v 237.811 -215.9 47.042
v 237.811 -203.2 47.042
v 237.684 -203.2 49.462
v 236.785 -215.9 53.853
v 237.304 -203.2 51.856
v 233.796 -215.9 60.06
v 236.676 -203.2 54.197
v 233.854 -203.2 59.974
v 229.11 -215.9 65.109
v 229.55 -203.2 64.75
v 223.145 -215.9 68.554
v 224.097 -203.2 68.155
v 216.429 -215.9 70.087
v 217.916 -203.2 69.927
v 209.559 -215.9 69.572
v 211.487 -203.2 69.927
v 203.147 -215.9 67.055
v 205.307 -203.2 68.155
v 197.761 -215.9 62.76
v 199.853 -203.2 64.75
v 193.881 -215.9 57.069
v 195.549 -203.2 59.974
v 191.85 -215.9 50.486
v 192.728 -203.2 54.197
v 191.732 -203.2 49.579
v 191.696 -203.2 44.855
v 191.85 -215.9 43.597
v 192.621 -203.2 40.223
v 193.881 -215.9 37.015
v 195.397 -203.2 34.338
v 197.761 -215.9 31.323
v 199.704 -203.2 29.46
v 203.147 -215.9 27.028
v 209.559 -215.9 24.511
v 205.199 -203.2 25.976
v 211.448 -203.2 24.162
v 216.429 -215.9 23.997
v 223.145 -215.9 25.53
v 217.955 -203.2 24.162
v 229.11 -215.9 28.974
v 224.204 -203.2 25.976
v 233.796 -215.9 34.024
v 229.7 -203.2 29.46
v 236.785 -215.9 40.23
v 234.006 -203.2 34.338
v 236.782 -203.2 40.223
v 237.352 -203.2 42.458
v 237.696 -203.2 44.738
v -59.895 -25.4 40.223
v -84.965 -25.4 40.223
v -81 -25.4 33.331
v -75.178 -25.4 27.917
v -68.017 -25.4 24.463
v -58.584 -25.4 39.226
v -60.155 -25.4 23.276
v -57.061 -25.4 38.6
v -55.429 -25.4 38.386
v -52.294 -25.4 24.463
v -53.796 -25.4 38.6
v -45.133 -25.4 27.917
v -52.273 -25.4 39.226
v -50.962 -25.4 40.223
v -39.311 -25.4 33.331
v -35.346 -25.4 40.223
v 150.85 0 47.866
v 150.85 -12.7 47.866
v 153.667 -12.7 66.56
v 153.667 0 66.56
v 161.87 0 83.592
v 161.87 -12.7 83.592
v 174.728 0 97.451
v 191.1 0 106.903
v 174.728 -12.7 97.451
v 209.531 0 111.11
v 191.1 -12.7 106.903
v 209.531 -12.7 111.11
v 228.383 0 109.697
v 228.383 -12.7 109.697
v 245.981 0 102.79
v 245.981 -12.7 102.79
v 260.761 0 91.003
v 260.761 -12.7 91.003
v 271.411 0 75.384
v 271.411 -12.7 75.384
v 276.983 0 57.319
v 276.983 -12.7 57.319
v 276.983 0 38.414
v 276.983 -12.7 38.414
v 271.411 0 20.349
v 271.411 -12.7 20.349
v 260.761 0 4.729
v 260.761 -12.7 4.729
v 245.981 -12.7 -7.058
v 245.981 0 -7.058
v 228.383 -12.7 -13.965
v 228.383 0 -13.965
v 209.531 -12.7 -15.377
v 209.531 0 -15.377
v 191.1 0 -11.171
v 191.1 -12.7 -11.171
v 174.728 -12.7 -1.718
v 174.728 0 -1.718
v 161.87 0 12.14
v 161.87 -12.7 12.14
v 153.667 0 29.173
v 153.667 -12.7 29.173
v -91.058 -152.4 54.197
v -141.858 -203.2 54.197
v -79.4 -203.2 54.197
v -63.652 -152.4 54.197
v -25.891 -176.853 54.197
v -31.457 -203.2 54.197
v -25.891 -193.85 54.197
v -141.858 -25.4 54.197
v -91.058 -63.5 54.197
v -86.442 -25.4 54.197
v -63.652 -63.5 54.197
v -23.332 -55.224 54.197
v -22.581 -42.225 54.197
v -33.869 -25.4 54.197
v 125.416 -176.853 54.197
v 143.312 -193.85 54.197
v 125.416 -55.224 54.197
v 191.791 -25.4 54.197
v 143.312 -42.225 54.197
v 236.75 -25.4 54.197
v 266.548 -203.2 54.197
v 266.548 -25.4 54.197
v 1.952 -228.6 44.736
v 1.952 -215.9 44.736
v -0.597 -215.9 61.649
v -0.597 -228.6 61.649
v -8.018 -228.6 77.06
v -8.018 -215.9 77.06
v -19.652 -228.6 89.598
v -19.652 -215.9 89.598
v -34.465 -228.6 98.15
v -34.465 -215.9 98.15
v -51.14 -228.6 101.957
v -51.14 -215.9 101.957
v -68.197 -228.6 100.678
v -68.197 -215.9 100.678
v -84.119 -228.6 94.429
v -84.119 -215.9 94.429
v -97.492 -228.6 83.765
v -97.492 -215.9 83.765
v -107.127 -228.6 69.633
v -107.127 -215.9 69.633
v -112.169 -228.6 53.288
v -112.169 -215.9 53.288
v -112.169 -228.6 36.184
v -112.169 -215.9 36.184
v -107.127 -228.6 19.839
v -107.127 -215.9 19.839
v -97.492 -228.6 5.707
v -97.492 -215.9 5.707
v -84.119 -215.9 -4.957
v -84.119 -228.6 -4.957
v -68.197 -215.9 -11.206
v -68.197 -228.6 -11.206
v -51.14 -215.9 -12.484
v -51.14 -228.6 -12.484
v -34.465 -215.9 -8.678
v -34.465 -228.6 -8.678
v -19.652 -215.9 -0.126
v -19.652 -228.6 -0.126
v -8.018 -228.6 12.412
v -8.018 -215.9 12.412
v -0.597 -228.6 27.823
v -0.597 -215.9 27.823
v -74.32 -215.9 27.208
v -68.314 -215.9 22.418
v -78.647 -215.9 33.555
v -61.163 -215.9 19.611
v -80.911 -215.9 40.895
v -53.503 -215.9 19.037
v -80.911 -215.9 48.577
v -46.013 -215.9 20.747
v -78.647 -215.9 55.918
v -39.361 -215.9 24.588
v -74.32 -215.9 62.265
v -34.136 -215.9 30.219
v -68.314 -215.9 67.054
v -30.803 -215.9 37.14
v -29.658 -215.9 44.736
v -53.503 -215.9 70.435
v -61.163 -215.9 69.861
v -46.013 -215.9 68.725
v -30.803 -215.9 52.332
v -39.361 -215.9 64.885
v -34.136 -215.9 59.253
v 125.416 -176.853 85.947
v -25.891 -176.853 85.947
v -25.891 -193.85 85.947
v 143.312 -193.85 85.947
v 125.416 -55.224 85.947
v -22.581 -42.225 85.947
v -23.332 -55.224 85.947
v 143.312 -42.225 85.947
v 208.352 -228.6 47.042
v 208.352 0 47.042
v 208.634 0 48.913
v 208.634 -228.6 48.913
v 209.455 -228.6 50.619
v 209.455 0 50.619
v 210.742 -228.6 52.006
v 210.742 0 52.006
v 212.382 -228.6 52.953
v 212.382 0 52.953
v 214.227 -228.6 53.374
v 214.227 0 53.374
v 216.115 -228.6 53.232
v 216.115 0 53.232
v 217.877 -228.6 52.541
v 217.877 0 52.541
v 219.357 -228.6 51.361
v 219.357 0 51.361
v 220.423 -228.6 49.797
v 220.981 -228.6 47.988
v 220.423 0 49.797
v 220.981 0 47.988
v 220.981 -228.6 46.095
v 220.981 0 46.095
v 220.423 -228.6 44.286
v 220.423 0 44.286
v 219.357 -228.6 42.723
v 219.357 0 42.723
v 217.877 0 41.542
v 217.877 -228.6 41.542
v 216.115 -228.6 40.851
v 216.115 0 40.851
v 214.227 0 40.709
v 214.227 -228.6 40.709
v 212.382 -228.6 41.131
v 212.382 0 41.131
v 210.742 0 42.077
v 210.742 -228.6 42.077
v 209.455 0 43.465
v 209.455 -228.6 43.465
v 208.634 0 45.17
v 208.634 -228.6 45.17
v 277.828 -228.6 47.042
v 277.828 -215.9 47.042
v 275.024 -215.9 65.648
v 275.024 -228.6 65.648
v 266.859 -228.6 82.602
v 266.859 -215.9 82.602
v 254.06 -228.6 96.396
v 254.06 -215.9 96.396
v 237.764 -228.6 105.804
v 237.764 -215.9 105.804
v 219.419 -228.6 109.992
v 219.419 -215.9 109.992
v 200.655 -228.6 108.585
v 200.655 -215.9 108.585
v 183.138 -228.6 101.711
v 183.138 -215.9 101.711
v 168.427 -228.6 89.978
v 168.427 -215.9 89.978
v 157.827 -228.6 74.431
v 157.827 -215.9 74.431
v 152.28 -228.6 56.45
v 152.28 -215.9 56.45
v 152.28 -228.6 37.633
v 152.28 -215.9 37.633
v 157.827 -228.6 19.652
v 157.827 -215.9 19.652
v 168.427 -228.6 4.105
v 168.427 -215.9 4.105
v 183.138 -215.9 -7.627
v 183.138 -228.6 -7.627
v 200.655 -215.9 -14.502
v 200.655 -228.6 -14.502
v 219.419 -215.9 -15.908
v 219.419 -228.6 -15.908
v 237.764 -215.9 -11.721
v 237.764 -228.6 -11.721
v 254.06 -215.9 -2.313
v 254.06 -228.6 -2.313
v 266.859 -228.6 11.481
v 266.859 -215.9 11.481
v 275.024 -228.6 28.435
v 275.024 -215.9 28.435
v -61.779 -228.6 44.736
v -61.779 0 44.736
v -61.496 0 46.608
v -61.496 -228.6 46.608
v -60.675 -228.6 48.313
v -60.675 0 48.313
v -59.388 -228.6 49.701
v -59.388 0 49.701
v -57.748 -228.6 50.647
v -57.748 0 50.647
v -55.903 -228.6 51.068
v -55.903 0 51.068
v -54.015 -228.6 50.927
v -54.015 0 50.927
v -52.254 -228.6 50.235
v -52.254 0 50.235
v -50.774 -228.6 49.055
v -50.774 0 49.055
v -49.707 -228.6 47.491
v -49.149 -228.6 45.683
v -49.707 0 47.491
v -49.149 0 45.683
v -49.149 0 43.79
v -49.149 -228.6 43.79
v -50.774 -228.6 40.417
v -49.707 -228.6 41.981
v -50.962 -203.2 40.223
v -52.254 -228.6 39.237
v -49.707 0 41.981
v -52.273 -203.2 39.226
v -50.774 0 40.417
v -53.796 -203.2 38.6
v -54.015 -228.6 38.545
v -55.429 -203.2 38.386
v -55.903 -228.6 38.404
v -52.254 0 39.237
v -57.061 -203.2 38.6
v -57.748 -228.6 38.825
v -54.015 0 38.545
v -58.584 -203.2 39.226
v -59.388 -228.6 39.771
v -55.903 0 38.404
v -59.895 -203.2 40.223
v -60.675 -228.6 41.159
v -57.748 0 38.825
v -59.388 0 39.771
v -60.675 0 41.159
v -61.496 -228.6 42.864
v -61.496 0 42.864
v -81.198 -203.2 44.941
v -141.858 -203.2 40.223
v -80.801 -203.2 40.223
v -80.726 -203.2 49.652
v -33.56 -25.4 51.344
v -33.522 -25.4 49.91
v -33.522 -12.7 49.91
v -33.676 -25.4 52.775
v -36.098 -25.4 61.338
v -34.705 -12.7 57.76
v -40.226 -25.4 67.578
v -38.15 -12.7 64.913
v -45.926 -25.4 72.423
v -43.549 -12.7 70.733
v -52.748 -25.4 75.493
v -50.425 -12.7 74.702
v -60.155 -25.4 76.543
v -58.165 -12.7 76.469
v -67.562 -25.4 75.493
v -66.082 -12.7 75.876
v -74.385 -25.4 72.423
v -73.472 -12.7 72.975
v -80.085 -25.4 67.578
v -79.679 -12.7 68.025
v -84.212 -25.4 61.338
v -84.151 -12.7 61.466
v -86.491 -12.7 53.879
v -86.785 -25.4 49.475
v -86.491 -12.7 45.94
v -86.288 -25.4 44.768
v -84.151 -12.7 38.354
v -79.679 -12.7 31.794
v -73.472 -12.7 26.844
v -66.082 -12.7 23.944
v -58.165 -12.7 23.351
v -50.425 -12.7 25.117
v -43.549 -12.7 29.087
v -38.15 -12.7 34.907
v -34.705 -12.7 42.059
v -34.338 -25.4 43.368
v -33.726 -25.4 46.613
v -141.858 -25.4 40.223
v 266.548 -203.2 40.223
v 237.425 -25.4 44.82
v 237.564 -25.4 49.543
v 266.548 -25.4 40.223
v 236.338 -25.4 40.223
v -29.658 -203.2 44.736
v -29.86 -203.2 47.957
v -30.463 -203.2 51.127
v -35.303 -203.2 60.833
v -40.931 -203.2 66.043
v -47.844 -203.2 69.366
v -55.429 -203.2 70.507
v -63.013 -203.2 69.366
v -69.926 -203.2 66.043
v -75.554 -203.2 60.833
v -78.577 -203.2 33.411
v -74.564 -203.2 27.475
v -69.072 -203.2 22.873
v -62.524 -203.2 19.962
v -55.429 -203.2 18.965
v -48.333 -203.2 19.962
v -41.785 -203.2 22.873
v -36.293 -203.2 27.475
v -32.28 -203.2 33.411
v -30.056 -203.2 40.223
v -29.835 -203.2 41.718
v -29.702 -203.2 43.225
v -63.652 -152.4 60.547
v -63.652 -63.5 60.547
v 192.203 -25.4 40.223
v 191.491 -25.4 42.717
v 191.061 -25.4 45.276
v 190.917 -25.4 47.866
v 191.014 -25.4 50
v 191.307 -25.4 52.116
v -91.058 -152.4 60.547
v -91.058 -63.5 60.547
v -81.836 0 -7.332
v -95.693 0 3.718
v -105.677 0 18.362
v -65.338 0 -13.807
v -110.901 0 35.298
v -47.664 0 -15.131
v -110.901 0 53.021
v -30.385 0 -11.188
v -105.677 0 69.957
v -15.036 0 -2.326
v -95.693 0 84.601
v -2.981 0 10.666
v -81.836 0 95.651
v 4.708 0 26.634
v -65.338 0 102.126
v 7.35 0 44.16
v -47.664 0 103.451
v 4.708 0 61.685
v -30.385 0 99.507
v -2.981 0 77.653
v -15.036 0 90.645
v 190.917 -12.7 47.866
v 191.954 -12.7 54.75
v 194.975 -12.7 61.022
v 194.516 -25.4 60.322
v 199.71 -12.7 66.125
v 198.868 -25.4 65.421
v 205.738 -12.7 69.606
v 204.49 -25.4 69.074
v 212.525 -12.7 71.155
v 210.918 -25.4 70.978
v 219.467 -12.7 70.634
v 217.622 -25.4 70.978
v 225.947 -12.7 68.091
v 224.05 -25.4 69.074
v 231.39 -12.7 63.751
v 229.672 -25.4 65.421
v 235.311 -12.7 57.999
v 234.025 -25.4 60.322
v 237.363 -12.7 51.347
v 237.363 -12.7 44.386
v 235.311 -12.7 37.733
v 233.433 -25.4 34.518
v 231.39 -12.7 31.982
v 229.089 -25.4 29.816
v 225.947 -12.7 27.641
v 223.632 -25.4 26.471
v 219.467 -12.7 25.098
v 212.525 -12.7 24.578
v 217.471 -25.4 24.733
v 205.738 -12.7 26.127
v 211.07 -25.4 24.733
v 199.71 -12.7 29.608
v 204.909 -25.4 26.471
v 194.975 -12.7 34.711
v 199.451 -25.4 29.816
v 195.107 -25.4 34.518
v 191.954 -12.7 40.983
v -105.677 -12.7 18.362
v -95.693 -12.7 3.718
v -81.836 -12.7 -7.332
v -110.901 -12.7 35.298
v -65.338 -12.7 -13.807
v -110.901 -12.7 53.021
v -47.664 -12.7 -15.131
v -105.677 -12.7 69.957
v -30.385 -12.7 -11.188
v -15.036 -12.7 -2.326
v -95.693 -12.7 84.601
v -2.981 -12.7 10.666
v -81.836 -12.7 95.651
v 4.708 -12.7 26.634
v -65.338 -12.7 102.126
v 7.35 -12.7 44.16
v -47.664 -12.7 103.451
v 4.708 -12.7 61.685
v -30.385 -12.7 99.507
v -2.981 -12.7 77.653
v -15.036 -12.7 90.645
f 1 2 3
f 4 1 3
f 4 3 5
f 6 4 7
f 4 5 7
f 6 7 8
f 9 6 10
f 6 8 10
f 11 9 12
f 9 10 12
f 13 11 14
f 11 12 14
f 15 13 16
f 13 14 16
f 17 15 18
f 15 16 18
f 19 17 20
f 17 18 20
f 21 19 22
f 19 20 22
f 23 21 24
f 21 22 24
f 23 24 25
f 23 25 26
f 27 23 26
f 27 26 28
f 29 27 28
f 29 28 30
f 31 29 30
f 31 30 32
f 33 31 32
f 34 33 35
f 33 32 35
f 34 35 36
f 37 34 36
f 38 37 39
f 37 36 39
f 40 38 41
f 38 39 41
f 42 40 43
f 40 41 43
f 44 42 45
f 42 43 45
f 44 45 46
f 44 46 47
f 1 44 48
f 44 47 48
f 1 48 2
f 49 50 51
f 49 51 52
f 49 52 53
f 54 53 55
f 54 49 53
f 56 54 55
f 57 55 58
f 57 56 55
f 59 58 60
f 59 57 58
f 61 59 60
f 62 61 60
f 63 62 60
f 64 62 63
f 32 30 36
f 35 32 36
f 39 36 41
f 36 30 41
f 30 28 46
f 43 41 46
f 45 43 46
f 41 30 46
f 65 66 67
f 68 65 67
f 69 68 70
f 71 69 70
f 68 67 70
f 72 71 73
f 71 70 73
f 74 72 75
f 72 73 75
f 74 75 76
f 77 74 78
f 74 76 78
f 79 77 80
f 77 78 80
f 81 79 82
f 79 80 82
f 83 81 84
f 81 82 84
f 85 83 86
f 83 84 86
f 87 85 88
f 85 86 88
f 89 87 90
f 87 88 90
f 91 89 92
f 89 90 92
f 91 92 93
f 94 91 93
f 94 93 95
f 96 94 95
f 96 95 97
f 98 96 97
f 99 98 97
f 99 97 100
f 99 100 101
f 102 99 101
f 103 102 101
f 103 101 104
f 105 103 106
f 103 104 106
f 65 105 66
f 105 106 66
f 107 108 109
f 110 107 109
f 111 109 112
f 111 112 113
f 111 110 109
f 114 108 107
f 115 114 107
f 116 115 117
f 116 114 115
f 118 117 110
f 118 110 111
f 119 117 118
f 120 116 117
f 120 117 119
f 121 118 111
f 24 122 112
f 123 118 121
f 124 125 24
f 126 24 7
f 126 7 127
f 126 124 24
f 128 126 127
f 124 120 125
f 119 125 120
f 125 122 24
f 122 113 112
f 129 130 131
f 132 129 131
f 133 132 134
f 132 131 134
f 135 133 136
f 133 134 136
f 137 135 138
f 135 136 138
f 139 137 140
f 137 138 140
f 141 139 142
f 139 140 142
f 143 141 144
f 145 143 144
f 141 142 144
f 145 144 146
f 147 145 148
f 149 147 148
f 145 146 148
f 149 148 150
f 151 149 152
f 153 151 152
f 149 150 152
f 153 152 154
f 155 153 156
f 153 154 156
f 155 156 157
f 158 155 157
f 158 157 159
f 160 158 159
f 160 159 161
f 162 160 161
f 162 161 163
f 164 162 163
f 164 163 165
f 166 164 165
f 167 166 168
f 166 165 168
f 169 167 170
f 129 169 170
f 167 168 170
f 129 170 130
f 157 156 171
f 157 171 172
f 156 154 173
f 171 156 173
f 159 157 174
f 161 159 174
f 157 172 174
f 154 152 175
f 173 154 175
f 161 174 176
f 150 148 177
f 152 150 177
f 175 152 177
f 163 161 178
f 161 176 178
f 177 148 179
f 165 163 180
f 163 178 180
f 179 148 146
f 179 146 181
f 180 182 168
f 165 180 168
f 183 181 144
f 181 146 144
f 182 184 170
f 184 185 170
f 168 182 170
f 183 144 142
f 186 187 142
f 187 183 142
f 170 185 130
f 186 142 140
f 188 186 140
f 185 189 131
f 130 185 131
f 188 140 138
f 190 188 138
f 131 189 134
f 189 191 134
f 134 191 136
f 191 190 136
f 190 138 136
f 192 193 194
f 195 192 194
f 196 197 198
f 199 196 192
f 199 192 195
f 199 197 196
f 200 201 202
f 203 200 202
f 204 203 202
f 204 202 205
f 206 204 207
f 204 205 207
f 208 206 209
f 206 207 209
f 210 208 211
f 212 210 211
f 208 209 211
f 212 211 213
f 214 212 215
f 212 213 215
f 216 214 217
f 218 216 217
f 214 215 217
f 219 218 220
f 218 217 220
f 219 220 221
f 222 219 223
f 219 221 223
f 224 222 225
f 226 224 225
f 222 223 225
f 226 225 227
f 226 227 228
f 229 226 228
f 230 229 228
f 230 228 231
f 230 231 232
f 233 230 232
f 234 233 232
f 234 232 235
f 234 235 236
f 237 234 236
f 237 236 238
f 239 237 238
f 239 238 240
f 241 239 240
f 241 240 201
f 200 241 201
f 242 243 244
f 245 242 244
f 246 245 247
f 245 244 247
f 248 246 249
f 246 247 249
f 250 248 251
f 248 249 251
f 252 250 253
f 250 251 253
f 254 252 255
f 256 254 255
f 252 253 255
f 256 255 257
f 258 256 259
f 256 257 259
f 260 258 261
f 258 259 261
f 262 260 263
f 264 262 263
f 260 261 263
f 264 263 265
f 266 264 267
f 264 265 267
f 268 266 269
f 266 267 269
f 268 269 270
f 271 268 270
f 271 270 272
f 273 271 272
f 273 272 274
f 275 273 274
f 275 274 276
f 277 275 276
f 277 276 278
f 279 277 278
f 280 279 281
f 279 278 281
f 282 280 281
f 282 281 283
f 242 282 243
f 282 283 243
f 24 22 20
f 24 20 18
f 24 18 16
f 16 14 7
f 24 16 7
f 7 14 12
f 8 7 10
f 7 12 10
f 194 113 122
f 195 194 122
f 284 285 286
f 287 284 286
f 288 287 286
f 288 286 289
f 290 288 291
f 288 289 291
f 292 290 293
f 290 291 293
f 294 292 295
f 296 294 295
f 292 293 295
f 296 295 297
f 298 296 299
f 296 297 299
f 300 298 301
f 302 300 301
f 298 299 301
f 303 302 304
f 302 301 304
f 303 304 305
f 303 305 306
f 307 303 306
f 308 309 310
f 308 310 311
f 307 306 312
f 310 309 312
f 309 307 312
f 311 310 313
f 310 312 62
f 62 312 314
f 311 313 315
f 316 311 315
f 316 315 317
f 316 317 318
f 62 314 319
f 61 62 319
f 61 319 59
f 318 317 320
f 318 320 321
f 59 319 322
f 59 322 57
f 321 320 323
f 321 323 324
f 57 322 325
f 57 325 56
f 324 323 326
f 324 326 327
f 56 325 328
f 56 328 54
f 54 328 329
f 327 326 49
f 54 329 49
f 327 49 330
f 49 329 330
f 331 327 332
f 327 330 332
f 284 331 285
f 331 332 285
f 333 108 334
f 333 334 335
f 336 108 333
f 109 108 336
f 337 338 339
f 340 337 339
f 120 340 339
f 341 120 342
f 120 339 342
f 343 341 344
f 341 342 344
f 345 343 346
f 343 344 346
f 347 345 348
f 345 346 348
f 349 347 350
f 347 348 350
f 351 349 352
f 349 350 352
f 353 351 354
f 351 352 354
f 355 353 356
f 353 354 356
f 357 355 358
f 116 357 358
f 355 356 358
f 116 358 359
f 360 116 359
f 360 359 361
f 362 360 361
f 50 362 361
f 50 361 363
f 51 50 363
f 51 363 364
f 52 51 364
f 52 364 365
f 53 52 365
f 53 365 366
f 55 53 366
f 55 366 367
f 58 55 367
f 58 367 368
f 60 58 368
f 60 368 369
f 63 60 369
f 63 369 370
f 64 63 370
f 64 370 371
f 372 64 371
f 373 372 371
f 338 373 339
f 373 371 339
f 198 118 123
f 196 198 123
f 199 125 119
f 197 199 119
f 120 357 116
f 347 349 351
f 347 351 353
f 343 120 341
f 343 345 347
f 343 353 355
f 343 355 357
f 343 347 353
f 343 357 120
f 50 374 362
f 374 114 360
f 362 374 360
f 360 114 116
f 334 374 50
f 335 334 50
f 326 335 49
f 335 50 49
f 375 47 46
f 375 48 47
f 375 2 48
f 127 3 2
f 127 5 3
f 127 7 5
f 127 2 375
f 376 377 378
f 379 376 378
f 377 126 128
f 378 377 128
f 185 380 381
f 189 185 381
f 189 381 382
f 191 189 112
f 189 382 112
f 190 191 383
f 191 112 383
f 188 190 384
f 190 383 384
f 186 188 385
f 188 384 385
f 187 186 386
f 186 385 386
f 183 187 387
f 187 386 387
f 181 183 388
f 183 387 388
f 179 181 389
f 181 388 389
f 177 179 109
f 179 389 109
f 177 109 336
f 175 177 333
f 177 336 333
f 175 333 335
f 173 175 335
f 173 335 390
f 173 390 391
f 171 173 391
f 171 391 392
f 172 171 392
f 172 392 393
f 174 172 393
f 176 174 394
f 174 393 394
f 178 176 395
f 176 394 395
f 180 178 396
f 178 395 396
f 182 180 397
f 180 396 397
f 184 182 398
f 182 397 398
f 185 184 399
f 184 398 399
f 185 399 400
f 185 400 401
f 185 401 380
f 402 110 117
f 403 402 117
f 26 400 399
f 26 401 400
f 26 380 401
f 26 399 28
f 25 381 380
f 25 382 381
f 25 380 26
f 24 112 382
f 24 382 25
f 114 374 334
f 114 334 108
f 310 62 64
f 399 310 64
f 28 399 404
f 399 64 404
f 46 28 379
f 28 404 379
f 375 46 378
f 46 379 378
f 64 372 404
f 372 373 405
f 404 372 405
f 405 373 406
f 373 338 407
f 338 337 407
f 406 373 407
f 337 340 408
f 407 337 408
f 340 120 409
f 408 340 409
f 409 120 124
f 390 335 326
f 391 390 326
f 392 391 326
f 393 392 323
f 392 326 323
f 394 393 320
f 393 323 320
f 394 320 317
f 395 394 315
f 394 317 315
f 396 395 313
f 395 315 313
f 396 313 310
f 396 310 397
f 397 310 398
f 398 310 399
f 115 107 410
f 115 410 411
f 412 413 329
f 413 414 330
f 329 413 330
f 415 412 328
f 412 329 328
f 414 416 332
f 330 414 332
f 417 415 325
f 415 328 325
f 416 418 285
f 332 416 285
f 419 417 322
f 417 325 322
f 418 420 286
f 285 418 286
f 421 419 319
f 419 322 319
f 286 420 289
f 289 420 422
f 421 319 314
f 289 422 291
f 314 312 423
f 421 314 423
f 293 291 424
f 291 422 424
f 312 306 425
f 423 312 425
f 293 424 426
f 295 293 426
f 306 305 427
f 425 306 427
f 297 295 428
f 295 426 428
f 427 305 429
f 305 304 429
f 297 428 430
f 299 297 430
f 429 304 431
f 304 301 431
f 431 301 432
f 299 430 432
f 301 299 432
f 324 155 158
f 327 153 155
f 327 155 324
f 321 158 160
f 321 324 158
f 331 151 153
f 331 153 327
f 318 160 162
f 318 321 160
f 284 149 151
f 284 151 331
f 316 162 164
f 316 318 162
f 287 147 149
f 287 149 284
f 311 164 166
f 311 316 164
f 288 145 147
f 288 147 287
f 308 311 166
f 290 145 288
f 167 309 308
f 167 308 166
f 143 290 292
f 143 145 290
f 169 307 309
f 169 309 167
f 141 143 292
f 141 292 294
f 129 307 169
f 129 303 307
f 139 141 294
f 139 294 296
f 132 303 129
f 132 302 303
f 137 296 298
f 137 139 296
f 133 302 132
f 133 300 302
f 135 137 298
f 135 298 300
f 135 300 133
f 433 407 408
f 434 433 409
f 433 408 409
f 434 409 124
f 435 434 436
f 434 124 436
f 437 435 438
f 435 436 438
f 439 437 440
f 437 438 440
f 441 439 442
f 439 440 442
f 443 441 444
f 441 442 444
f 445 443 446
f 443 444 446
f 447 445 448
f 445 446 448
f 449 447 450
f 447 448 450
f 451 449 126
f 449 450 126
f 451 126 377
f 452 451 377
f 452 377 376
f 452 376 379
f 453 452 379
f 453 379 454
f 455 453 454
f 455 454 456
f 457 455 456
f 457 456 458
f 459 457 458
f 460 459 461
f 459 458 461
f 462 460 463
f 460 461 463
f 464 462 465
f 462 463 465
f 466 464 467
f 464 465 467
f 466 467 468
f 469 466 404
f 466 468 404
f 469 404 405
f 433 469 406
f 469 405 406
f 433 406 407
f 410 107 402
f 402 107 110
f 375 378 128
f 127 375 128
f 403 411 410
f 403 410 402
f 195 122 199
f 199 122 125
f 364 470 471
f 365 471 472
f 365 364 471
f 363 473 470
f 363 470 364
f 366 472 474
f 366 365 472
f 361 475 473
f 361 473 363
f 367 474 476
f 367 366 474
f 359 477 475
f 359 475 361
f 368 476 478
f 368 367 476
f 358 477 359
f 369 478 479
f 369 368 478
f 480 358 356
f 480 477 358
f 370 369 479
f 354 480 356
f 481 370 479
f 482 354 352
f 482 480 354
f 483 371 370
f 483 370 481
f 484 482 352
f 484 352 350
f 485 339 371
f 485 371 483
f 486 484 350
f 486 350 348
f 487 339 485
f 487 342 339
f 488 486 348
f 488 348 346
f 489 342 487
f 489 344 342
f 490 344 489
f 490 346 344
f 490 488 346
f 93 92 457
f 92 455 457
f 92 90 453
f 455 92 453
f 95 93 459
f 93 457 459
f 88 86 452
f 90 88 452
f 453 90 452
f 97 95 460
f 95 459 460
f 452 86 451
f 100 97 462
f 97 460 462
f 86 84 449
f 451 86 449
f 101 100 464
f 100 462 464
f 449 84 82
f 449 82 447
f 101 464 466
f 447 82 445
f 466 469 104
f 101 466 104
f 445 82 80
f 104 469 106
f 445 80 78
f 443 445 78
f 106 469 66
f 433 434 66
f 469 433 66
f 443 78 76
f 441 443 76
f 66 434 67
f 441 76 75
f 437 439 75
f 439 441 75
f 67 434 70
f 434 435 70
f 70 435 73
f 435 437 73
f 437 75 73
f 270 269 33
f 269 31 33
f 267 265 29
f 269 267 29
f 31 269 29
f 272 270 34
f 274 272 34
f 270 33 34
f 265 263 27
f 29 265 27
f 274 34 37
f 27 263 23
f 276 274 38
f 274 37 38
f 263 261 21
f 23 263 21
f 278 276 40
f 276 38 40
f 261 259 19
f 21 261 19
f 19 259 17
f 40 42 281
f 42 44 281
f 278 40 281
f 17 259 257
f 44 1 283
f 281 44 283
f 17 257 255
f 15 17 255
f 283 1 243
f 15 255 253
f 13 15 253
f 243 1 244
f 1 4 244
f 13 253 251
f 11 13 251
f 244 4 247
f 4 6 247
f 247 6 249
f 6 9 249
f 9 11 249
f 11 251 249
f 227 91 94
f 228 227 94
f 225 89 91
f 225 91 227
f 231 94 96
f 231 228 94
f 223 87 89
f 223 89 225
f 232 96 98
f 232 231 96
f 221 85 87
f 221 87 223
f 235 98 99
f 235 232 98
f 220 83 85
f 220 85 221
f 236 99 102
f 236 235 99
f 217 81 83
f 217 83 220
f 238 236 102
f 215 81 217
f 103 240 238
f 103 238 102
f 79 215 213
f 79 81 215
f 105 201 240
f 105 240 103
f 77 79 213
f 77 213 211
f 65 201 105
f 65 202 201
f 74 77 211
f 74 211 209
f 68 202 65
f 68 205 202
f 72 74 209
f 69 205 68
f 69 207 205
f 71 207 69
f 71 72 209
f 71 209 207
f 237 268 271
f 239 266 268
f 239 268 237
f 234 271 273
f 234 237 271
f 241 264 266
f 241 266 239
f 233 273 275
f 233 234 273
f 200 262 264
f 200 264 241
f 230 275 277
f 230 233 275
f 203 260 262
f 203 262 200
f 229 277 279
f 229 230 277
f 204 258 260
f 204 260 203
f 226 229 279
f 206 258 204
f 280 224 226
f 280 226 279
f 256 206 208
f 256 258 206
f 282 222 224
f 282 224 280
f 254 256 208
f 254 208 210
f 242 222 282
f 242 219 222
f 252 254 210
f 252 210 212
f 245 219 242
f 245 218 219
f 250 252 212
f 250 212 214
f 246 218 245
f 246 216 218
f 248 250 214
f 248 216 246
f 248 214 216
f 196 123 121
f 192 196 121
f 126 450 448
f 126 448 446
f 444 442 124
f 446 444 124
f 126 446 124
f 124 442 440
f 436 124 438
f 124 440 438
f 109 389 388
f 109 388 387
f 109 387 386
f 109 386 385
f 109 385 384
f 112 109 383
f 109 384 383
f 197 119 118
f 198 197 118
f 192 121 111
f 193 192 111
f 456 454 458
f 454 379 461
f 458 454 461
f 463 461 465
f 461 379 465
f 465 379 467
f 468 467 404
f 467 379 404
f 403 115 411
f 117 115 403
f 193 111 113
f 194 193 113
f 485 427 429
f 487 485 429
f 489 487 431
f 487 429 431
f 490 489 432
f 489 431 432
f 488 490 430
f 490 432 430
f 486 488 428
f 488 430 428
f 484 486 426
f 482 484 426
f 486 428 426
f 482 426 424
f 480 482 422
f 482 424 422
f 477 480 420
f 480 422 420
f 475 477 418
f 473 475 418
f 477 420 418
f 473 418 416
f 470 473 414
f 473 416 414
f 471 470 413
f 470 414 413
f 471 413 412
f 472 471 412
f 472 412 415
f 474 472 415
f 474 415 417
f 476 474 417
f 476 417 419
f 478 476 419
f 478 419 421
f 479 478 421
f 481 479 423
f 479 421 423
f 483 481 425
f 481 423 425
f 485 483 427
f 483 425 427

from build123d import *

# Parameters (mm, degrees)
F0_R      = 59.457359
F1_DEPTH  = 12.7
F3_R      = 26.633643
F4_DEPTH  = 12.7
F5_W      = 408.406466
F5_H      = 13.974104
F6_DEPTH  = 177.8
F7_R      = 25.770774
F8_DEPTH  = 12.7
F9_R      = 57.38091
F10_DEPTH = 12.7
F11_W     = 27.406466
F11_H     = 88.9
F12_DEPTH = 6.35
F13_R     = 23.109581
F14_DEPTH = 12.7
F15_R     = 63.126409
F16_DEPTH = 12.7
F17_R     = 23.353727
F18_DEPTH = 12.7
F19_R     = 63.420854
F20_DEPTH = 12.7
F22_DEPTH = 31.75
F24_D     = 12.7
F26_D     = 12.7


with BuildPart() as f1:
    # F0 (on Front) → F1 (new body)
    with BuildSketch(Plane.XZ):
        with Locations((-52.107409, 44.159733)):
            Circle(F0_R)
    extrude(amount=F1_DEPTH)

    # F3 (on face) → F4 (join)
    with BuildSketch(Plane.XZ.offset(12.7)):
        with Locations((-60.155295, 49.909814)):
            Circle(F3_R)
    extrude(amount=F4_DEPTH)

    # F5 (on face) → F6 (join)
    with BuildSketch(Plane.XZ.offset(25.4)):
        with Locations((62.345162, 47.209637)):
            Rectangle(F5_W, F5_H)
    extrude(amount=F6_DEPTH)

    # F7 (on face) → F8 (join)
    with BuildSketch(Plane.XZ.offset(203.2)):
        with Locations((-55.428505, 44.736113)):
            Circle(F7_R)
    extrude(amount=F8_DEPTH)

    # F9 (on face) → F10 (join)
    with BuildSketch(Plane.XZ.offset(215.9)):
        with Locations((-55.428505, 44.736113)):
            Circle(F9_R)
    extrude(amount=F10_DEPTH)

    # F11 (on face) → F12 (join)
    with BuildSketch(Plane.XY.offset(54.196689)):
        with Locations((-77.354838, -107.95)):
            Rectangle(F11_W, F11_H)
    extrude(amount=F12_DEPTH)

    # F13 (on face) → F14 (join)
    with BuildSketch(Plane.XZ.offset(203.2)):
        with Locations((214.701638, 47.041636)):
            Circle(F13_R)
    extrude(amount=F14_DEPTH)

    # F15 (on face) → F16 (join)
    with BuildSketch(Plane.XZ.offset(215.9)):
        with Locations((214.701638, 47.041636)):
            Circle(F15_R)
    extrude(amount=F16_DEPTH)

    # F17 (on face) → F18 (join)
    with BuildSketch(Plane(origin=(0, -25.4, 0), x_dir=(-1, 0, 0), z_dir=(0, 1, 0))):
        with Locations((-214.270413, 47.866244)):
            Circle(F17_R)
    extrude(amount=F18_DEPTH)

    # F19 (on face) → F20 (join)
    with BuildSketch(Plane(origin=(0, -12.7, 0), x_dir=(-1, 0, 0), z_dir=(0, 1, 0))):
        with Locations((-214.270413, 47.866244)):
            Circle(F19_R)
    extrude(amount=F20_DEPTH)

    # F21 (on face) → F22 (join)
    with BuildSketch(Plane.XY.offset(54.196689)):
        Polygon((143.312216, -42.225428), (-22.581015, -42.225428), (-23.332113, -55.224109), (125.416026, -55.224109), (125.416026, -176.853418), (-25.890864, -176.853418), (-25.890864, -193.850324), (143.312216, -193.850324), align=None)
    extrude(amount=F22_DEPTH)

    # F24 (through all)
    with Locations(Plane.XZ.offset(228.6)):
        with Locations((-55.428505, 44.736113)):
            Hole(F24_D / 2)

    # F26 (through all)
    with Locations(Plane.XZ.offset(228.6)):
        with Locations((214.701638, 47.041636)):
            Hole(F26_D / 2)


solid = f1.part
